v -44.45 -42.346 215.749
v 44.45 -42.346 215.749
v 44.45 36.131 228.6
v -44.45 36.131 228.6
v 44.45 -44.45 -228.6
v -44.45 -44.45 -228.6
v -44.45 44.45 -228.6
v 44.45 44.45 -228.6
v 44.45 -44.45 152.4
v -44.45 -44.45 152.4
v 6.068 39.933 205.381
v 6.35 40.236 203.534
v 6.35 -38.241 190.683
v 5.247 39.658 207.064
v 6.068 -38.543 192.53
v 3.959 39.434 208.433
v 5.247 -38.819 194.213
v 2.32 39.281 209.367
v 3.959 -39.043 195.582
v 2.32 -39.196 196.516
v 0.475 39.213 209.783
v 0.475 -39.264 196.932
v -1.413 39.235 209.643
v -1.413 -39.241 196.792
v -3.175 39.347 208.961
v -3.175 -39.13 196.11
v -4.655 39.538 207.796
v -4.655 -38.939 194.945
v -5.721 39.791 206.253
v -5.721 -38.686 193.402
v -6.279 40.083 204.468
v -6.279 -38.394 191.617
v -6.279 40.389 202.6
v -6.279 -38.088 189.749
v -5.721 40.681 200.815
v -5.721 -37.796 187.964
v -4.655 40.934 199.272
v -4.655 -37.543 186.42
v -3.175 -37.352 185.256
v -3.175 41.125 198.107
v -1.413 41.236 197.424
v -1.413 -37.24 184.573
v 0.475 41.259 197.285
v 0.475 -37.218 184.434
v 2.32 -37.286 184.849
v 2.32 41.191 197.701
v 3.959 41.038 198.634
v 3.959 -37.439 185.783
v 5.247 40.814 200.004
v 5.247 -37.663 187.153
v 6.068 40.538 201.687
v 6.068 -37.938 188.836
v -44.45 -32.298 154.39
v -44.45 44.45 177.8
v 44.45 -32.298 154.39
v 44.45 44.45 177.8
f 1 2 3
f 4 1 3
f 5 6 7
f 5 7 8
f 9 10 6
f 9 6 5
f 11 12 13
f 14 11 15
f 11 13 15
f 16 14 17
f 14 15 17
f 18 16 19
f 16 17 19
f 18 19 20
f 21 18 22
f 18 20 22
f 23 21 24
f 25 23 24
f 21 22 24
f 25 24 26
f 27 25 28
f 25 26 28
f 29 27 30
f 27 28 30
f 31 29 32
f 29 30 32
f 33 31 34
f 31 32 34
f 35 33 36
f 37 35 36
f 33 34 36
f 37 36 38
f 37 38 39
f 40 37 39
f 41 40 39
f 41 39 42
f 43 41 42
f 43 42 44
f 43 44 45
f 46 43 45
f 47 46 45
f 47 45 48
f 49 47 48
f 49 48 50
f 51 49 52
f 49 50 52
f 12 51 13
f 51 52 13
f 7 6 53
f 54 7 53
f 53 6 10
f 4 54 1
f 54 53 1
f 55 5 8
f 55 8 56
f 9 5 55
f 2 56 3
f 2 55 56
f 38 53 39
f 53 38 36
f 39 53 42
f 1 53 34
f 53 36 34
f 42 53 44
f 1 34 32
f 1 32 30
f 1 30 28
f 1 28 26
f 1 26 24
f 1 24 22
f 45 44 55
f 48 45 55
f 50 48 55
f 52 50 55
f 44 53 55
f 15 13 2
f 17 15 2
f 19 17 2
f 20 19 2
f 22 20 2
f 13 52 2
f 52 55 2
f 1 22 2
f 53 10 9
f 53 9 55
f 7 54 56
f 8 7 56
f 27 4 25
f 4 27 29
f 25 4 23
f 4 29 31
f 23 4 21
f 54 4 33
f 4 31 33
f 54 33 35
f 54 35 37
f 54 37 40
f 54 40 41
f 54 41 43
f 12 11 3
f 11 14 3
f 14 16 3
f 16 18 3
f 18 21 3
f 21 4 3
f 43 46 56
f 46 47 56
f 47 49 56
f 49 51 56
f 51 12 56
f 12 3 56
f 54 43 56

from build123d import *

# Parameters (mm, degrees)
F0_W     = 88.9
F0_H     = 457.2
F1_DEPTH = 44.45
F3_DEPTH = 127
F4_R     = 6.35
F5_DEPTH = 127


with BuildPart() as f1:
    # F0 (on Front) → F1 (new body, symmetric)
    with BuildSketch(Plane.XZ):
        Rectangle(F0_W, F0_H)
    extrude(amount=F1_DEPTH, both=True)

    # F2 (on Right) → F3 (cut, symmetric)
    with BuildSketch(Plane.YZ):
        Polygon((44.45, 177.8), (44.45, 228.6), (36.1311809715, 228.6), align=None)
        Polygon((-42.3455583973, 215.7489410875), (36.1311809715, 228.6), (34.0267393688, 241.4510589125), (-44.45, 228.6), align=None)
        Polygon((-32.2976503157, 154.3900235786), (-42.3455583973, 215.7489410875), (-44.45, 228.6), (-44.45, 152.4), align=None)
    extrude(amount=F3_DEPTH, both=True, mode=Mode.SUBTRACT)

    # F4 (on face) → F5 (cut, symmetric)
    with BuildSketch(Plane(origin=(0, -6.8321038597, -1.1187999132), x_dir=(1, 0, 0), z_dir=(0, -0.9868557164, -0.1616038211))):
        with Locations((0, 194.3562798646)):
            Circle(F4_R)
    extrude(amount=F5_DEPTH, both=True, mode=Mode.SUBTRACT)


solid = f1.part
